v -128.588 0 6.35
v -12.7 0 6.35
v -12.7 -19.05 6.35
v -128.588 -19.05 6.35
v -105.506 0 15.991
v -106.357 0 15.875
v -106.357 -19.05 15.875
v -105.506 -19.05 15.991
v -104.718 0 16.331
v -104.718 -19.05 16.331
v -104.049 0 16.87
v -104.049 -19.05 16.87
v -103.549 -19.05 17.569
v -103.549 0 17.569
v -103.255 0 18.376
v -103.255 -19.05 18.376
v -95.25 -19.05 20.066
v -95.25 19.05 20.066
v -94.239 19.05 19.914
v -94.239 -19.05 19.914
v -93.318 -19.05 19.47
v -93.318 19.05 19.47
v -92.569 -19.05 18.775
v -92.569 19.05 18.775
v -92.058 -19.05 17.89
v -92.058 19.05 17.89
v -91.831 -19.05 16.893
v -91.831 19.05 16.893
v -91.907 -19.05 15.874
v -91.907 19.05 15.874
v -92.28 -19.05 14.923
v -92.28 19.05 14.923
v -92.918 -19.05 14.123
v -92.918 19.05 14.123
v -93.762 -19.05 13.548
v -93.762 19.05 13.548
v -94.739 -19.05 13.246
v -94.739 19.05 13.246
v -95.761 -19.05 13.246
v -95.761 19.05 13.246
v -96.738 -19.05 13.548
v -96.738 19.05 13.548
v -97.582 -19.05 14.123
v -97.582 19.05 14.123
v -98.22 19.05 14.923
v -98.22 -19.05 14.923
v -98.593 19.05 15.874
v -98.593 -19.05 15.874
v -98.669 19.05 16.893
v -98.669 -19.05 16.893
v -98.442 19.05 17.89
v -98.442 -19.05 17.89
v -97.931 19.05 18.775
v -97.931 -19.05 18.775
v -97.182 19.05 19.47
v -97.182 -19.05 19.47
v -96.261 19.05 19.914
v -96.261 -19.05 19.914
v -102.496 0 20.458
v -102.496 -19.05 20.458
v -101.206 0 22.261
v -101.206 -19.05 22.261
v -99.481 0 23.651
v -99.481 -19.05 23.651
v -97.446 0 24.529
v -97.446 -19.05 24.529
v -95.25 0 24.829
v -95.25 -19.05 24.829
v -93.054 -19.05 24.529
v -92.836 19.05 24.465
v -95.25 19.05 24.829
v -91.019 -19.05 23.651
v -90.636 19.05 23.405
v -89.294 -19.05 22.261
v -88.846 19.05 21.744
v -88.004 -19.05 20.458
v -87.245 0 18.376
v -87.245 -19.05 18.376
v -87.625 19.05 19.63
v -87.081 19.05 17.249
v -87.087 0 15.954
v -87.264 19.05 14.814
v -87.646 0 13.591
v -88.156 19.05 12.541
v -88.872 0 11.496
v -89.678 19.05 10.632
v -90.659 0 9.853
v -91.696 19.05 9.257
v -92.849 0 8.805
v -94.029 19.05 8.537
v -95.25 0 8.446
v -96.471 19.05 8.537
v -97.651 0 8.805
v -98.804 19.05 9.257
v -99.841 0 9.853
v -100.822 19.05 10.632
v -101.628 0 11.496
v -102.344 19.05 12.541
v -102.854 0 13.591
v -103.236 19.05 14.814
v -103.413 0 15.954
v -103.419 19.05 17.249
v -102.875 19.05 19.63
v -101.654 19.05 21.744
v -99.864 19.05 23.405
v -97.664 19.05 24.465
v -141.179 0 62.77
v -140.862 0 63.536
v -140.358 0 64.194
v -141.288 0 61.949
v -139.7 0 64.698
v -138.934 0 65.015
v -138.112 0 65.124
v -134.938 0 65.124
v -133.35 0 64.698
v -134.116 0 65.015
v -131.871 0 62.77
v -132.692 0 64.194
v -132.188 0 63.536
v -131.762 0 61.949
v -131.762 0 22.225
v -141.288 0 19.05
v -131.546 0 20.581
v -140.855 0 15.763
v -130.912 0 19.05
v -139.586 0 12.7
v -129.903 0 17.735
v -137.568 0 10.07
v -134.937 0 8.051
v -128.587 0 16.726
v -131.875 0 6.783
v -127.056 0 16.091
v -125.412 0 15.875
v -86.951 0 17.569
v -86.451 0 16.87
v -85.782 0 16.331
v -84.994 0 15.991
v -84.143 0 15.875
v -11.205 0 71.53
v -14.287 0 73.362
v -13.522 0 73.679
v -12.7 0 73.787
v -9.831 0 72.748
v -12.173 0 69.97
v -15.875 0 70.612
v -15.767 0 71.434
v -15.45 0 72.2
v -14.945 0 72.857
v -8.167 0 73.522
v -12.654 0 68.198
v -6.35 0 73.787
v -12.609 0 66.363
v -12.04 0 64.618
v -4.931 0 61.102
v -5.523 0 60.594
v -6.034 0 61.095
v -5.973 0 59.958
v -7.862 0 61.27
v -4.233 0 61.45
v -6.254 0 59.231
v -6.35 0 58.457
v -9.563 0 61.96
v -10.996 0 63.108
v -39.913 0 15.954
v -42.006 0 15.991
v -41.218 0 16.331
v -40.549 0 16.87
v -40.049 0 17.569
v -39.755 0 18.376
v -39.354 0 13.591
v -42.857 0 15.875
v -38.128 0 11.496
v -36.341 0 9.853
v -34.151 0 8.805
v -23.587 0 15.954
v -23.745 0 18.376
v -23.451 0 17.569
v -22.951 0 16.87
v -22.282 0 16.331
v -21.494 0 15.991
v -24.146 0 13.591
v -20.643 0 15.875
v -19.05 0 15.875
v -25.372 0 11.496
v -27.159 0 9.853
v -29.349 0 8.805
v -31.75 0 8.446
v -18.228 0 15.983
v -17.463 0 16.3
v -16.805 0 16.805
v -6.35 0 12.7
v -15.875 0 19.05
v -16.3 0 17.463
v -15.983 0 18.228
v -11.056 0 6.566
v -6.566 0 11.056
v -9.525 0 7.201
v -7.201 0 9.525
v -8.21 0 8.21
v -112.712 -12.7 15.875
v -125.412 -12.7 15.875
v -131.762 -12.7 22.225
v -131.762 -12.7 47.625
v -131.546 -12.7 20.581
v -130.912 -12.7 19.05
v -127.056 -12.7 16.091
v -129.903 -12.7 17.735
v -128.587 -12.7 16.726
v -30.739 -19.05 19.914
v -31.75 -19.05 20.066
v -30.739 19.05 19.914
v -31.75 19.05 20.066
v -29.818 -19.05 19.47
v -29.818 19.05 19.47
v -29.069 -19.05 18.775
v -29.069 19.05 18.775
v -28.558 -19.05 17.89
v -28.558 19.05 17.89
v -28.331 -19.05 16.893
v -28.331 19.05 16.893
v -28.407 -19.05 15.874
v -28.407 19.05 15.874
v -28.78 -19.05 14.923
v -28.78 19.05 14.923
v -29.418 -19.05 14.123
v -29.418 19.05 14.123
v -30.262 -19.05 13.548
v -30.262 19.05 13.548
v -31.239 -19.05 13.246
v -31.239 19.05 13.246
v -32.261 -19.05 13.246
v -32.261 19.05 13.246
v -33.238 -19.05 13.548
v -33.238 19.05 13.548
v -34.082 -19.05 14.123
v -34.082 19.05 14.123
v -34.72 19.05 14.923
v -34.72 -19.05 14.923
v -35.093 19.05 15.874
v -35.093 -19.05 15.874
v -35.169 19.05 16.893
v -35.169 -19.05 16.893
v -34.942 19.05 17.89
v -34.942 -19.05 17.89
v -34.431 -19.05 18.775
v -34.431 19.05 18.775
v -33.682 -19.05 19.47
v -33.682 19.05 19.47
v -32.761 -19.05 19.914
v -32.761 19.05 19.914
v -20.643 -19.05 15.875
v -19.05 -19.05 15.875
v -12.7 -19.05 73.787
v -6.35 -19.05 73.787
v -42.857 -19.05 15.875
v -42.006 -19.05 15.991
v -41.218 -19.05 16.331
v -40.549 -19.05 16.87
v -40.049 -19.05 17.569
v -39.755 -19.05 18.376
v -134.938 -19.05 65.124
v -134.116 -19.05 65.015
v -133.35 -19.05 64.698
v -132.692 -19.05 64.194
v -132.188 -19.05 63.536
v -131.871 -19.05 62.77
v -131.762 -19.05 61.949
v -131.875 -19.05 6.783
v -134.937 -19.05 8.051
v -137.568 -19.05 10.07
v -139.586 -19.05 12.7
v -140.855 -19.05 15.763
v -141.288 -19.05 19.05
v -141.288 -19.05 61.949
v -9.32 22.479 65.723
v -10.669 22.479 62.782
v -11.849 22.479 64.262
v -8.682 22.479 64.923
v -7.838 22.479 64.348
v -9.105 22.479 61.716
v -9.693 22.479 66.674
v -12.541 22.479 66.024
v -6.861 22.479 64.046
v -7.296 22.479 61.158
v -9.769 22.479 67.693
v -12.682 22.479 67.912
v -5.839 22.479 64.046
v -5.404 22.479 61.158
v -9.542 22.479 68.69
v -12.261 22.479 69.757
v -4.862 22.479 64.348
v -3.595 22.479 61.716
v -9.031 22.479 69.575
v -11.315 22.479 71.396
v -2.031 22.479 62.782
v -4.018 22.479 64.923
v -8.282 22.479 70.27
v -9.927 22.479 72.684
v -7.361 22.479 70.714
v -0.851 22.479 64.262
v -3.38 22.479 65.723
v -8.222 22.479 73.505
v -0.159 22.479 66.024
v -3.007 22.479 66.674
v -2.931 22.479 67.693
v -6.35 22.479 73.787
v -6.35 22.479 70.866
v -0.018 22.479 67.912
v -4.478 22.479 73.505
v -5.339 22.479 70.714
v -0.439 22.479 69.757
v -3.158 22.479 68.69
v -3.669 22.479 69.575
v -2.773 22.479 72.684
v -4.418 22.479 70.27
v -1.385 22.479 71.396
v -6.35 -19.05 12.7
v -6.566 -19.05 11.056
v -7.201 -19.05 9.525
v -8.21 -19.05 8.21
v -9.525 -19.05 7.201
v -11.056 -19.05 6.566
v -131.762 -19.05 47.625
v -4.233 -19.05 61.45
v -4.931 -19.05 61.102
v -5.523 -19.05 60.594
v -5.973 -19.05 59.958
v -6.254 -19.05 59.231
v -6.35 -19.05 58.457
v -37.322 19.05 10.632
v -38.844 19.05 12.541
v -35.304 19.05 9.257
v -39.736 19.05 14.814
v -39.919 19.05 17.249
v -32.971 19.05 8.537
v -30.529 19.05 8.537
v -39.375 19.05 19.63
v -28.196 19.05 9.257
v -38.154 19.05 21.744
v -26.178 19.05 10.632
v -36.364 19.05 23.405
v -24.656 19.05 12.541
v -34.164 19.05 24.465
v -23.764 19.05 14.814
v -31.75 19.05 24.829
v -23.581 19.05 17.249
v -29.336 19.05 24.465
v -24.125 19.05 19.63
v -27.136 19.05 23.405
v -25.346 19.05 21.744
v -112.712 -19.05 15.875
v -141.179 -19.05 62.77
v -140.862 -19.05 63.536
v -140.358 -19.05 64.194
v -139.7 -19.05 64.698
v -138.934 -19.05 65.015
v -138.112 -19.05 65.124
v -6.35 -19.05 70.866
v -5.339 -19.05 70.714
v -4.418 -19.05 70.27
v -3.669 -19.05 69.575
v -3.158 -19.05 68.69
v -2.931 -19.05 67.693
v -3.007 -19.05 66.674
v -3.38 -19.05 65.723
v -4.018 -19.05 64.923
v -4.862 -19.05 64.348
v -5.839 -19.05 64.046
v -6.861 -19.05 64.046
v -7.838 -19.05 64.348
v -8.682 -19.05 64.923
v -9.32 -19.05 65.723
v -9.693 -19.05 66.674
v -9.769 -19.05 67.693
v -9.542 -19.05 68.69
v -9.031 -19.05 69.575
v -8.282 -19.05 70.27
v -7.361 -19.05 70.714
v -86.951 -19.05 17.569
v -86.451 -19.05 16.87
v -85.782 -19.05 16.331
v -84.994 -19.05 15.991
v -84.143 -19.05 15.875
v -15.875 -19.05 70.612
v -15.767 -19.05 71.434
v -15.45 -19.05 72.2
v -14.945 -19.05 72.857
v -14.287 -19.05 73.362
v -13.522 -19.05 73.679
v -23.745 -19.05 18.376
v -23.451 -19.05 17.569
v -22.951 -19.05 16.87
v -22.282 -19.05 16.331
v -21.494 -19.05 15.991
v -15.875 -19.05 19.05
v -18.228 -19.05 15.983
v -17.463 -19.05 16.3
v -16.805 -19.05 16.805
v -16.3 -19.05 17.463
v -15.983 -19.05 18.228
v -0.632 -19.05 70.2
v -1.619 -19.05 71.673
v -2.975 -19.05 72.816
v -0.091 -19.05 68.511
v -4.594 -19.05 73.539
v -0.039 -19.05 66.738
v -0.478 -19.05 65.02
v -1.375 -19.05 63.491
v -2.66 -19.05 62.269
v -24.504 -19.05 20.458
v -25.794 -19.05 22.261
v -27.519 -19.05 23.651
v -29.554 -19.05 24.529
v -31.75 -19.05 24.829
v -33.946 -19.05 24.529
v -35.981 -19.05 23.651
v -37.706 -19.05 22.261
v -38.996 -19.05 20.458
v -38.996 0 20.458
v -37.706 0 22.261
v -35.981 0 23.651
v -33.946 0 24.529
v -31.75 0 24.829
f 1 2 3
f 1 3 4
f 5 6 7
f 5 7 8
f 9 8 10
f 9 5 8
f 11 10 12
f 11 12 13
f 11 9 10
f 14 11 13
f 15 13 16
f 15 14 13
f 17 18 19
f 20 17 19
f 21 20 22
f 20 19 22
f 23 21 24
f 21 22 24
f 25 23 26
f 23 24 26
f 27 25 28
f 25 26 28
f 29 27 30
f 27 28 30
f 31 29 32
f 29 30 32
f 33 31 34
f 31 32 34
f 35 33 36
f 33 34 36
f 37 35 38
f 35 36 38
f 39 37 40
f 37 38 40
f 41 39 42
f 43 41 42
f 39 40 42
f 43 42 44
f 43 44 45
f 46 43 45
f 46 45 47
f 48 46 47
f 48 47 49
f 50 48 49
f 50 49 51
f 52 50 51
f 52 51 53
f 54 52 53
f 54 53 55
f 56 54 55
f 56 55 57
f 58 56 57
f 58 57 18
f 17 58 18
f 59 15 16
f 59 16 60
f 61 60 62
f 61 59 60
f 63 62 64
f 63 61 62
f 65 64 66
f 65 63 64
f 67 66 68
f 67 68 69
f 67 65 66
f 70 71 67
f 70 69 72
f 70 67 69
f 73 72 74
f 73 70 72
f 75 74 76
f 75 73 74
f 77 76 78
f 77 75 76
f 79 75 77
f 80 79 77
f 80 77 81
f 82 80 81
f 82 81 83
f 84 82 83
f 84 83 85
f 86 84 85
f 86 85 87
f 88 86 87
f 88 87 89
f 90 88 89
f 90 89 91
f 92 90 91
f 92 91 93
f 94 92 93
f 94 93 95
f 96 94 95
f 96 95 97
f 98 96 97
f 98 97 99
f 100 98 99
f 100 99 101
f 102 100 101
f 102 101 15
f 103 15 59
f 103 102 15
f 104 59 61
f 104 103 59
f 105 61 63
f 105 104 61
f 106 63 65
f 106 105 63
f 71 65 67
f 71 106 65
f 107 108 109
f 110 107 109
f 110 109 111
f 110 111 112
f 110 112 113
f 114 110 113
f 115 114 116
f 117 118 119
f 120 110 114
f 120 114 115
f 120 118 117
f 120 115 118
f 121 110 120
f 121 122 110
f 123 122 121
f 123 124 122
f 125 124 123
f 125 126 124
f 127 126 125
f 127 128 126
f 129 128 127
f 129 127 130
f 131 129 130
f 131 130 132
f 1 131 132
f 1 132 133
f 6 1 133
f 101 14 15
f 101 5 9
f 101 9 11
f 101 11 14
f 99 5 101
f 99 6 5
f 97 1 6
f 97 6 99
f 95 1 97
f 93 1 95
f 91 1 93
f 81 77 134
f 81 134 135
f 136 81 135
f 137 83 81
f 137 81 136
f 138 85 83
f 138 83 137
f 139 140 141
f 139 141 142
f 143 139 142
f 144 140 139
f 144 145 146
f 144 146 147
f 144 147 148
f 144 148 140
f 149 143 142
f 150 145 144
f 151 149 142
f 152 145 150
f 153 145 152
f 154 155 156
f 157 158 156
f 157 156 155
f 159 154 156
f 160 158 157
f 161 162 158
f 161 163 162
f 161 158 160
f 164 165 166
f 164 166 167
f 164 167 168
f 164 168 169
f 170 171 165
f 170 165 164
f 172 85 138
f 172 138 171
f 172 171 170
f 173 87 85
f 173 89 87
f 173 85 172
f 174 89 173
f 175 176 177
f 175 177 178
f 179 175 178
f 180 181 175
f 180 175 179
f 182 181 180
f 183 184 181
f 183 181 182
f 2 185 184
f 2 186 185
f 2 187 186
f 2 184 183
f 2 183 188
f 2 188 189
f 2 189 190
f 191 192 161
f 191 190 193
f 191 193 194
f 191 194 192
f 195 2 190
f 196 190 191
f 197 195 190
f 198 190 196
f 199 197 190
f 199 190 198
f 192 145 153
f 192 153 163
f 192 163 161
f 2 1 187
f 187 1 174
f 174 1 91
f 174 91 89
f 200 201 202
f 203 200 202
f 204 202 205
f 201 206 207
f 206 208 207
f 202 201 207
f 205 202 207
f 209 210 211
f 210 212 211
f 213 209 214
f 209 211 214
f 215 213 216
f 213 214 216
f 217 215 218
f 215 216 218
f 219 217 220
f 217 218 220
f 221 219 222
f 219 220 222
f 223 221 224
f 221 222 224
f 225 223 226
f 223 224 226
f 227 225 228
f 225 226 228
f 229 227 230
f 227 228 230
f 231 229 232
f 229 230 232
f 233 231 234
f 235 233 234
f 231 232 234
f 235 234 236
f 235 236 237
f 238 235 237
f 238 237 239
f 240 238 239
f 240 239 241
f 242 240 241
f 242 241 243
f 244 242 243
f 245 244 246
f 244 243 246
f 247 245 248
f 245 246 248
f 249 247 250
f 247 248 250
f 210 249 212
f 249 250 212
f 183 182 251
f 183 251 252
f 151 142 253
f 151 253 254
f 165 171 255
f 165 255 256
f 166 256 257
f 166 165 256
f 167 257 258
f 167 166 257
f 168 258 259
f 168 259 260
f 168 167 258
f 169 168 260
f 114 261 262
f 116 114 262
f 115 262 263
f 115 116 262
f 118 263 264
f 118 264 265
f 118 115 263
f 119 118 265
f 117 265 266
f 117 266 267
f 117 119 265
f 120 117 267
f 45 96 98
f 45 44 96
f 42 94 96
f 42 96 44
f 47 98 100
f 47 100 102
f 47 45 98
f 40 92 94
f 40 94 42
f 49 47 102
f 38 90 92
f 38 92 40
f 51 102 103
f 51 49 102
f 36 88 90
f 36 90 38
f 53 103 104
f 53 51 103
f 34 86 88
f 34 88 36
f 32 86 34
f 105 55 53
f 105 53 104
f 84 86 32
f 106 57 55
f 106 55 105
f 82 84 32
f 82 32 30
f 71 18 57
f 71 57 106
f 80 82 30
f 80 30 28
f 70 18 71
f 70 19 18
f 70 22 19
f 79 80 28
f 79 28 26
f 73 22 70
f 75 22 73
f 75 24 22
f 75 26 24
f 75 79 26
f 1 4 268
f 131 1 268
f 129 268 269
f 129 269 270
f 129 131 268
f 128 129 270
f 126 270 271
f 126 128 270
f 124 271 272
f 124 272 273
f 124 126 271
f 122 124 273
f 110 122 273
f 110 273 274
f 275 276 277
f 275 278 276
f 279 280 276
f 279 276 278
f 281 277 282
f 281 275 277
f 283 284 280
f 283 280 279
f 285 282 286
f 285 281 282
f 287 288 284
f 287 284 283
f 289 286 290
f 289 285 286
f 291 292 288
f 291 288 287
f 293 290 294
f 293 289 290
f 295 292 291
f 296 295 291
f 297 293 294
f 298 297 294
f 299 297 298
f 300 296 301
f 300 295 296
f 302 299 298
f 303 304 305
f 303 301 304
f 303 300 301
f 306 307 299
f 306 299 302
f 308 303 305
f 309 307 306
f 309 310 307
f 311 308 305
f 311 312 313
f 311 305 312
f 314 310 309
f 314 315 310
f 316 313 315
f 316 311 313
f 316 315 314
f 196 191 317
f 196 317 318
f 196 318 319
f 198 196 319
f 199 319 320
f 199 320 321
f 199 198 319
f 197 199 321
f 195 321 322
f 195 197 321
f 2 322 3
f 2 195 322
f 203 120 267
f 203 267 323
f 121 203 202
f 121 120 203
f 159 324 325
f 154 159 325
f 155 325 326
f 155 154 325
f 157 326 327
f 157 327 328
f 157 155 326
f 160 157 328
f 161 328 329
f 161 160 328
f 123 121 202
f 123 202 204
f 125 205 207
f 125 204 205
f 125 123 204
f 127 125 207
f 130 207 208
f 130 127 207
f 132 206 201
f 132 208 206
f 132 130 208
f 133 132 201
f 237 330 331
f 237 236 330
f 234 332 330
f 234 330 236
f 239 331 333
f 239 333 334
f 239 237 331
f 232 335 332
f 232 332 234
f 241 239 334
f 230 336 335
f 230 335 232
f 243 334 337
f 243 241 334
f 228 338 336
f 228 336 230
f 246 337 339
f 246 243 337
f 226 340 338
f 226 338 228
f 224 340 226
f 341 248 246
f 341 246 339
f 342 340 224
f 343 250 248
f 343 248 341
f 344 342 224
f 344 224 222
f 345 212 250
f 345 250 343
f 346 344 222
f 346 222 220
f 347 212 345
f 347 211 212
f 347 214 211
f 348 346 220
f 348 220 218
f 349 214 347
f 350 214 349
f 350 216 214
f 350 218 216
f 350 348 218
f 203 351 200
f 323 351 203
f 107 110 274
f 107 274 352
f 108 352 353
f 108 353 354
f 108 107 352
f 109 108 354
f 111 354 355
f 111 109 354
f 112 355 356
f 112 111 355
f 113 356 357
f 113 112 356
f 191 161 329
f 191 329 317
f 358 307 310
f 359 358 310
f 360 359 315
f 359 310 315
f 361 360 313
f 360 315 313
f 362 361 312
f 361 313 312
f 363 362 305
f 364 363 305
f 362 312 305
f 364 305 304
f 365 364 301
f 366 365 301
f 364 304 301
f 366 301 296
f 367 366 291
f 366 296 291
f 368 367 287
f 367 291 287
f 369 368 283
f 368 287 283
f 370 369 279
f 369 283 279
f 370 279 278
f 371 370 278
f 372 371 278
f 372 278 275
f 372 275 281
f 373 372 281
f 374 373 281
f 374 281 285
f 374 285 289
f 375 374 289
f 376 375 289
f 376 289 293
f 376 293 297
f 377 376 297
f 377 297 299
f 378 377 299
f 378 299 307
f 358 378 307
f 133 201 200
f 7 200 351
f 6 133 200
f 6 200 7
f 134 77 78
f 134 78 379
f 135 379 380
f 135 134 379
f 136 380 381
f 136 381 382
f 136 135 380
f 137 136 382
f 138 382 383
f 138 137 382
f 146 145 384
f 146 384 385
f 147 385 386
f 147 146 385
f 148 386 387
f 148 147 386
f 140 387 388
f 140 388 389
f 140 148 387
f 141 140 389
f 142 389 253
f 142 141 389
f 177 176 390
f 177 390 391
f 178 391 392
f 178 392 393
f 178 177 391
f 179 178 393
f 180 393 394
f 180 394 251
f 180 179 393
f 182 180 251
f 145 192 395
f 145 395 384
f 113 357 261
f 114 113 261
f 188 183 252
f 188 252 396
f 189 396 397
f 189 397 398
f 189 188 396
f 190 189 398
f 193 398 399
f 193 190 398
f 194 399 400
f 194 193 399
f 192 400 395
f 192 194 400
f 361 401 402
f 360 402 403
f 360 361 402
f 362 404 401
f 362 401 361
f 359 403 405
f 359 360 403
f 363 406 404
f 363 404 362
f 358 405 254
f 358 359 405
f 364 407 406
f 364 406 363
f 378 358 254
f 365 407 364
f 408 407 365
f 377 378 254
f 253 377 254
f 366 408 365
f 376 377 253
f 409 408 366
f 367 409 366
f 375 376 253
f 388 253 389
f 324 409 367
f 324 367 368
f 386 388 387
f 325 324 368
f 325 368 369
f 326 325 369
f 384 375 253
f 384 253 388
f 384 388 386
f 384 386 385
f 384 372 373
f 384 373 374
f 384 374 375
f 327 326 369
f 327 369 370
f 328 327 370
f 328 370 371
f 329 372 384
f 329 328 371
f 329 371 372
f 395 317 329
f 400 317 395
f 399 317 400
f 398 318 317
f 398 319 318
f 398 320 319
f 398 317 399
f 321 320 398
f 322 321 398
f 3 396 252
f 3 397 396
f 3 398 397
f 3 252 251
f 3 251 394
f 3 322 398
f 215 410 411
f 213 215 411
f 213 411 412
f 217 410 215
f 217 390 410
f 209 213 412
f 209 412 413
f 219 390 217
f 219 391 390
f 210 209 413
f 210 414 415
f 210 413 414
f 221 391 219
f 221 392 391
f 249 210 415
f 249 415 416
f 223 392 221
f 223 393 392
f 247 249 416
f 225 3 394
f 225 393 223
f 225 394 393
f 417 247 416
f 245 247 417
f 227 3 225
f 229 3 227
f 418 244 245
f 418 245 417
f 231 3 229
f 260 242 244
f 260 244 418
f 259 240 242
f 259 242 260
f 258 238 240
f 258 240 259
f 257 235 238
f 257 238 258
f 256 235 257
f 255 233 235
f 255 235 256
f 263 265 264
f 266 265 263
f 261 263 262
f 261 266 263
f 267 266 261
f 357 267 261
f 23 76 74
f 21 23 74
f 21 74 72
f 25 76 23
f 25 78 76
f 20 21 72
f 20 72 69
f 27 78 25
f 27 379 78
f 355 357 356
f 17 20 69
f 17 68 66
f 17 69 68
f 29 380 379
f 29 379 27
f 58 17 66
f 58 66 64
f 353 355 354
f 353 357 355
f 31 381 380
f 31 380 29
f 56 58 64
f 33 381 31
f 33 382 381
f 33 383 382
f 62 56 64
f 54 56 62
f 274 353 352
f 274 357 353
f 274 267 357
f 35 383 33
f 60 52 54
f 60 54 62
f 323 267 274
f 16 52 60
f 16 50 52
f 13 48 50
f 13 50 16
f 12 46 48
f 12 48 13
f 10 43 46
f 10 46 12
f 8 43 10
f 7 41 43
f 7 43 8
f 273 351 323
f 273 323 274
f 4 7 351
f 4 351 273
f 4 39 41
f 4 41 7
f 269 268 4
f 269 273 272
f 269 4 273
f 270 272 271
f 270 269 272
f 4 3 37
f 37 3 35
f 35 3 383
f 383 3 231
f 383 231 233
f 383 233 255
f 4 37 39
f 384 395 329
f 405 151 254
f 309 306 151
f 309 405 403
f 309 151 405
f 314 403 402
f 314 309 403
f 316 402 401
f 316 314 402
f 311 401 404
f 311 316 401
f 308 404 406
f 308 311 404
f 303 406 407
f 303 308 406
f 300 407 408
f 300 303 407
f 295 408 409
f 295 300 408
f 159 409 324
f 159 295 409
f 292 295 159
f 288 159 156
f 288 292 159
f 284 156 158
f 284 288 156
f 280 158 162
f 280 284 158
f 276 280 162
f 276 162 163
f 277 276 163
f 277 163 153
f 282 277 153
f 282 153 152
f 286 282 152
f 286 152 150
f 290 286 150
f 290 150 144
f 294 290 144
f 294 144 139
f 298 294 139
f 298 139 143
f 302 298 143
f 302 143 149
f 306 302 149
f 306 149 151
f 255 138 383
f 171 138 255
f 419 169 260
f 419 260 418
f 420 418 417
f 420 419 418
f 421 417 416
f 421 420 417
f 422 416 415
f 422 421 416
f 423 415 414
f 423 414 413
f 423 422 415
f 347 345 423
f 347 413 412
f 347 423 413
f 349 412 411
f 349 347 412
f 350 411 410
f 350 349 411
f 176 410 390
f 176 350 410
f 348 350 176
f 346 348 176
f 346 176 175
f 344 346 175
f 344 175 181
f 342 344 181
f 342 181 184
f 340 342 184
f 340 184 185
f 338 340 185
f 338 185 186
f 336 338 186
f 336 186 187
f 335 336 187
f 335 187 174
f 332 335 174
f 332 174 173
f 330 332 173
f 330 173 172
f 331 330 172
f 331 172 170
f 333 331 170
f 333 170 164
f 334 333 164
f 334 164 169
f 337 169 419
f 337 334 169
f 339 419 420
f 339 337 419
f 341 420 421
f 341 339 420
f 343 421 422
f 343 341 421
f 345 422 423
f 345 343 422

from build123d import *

# Parameters (mm, degrees)
SKETCH2_R           = 3.429
BOSS_EXTRUDE1_DEPTH = 19.05
BOSS_EXTRUDE2_START = 19.05
SKETCH3_R           = 8.1915
SKETCH3_R_2         = 3.429
SKETCH3_R_3         = 6.35
BOSS_EXTRUDE2_DEPTH = 19.05
BOSS_EXTRUDE5_START = 3.429
SKETCH4_R           = 6.35
SKETCH4_R_2         = 3.429
BOSS_EXTRUDE5_DEPTH = 3.429
BOSS_EXTRUDE6_START = -19.05
BOSS_EXTRUDE6_DEPTH = 6.35


with BuildPart() as part:
    # Sketch2 → Boss-Extrude1 (new body)
    with BuildSketch(Plane(origin=(0, 0, 0), x_dir=(1, 0, 0), z_dir=(0, 1, 0))):
        with BuildLine():
            Line((-84.142567987, -15.875), (-42.857432013, -15.875))
            ThreePointArc((-42.857432013, -15.875), (-40.864863591, -16.578098691), (-39.754797373, -18.375994594))
            ThreePointArc((-39.754797373, -18.375994594), (-31.75, -24.828560646), (-23.745202627, -18.375994594))
            ThreePointArc((-23.745202627, -18.375994594), (-22.635136409, -16.578098691), (-20.642567987, -15.875))
            Line((-20.642567987, -15.875), (-19.05, -15.875))
            ThreePointArc((-19.05, -15.875), (-16.80493597, -16.80493597), (-15.875, -19.05))
            Line((-15.875, -19.05), (-15.875, -70.612060646))
            ThreePointArc((-15.875, -70.612060646), (-14.94506403, -72.857124676), (-12.7, -73.787060646))
            Line((-12.7, -73.787060646), (-6.35, -73.787060646))
            ThreePointArc((-6.35, -73.787060646), (-0.091449146, -68.510858211), (-4.233333333, -61.450223232))
            ThreePointArc((-4.233333333, -61.450223232), (-5.767376644, -60.28989163), (-6.35, -58.456804525))
            Line((-6.35, -58.456804525), (-6.35, -12.7))
            ThreePointArc((-6.35, -12.7), (-8.209871939, -8.209871939), (-12.7, -6.35))
            Line((-12.7, -6.35), (-128.5875, -6.35))
            ThreePointArc((-128.5875, -6.35), (-137.567756121, -10.069743879), (-141.2875, -19.05))
            Line((-141.2875, -19.05), (-141.2875, -61.948583794))
            ThreePointArc((-141.2875, -61.948583794), (-140.35756403, -64.193647824), (-138.1125, -65.123583794))
            Line((-138.1125, -65.123583794), (-134.9375, -65.123583794))
            ThreePointArc((-134.9375, -65.123583794), (-132.69243597, -64.193647824), (-131.7625, -61.948583794))
            Line((-131.7625, -61.948583794), (-131.7625, -22.225))
            ThreePointArc((-131.7625, -22.225), (-129.90262806, -17.734871939), (-125.4125, -15.875))
            Line((-125.4125, -15.875), (-106.357432013, -15.875))
            ThreePointArc((-106.357432013, -15.875), (-104.364863591, -16.578098691), (-103.254797373, -18.375994594))
            ThreePointArc((-103.254797373, -18.375994594), (-95.25, -24.828560646), (-87.245202627, -18.375994594))
            ThreePointArc((-87.245202627, -18.375994594), (-86.135136409, -16.578098691), (-84.142567987, -15.875))
        make_face()
        with Locations(Location((-95.25, -16.637060646, 0), (0, 0, 270))):
            Circle(SKETCH2_R, mode=Mode.SUBTRACT)
        with Locations(Location((-31.75, -16.637060646, 0), (0, 0, 270))):
            Circle(SKETCH2_R, mode=Mode.SUBTRACT)
        with Locations(Location((-6.35, -67.437060646, 0), (0, 0, 270))):
            Circle(SKETCH2_R, mode=Mode.SUBTRACT)
    extrude(amount=-BOSS_EXTRUDE1_DEPTH)

    # Sketch3 → Boss-Extrude2 (add)
    # profile 1 of 3: a face of its own
    with BuildSketch(Plane(origin=(0, 0, 0), x_dir=(1, 0, 0), z_dir=(0, 1, 0)).offset(BOSS_EXTRUDE2_START)):
        with Locations(Location((-95.25, -16.637060646, 0), (0, 0, 270))):
            Circle(SKETCH3_R)
        with Locations(Location((-95.25, -16.637060646, 0), (0, 0, 270))):
            Circle(SKETCH3_R_2, mode=Mode.SUBTRACT)
    # profile 2 of 3: a face of its own
    with BuildSketch(Plane(origin=(0, 0, 0), x_dir=(1, 0, 0), z_dir=(0, 1, 0)).offset(BOSS_EXTRUDE2_START)):
        with Locations(Location((-31.75, -16.637060646, 0), (0, 0, 270))):
            Circle(SKETCH3_R)
        with Locations(Location((-31.75, -16.637060646, 0), (0, 0, 270))):
            Circle(SKETCH3_R_2, mode=Mode.SUBTRACT)
    # profile 3 of 3: a face of its own
    with BuildSketch(Plane(origin=(0, 0, 0), x_dir=(1, 0, 0), z_dir=(0, 1, 0)).offset(BOSS_EXTRUDE2_START)):
        with Locations(Location((-6.35, -67.437060646, 0), (0, 0, 270))):
            Circle(SKETCH3_R_3)
        with Locations(Location((-6.35, -67.437060646, 0), (0, 0, 270))):
            Circle(SKETCH3_R_2, mode=Mode.SUBTRACT)
    extrude(amount=-BOSS_EXTRUDE2_DEPTH)

    # Sketch4 → Boss-Extrude5 (add)
    with BuildSketch(Plane(origin=(0, 19.05, 0), x_dir=(1, 0, 0), z_dir=(0, 1, 0)).offset(BOSS_EXTRUDE5_START)):
        with Locations(Location((-6.35, -67.437060646, 0), (0, 0, 270))):
            Circle(SKETCH4_R)
        with Locations(Location((-6.35, -67.437060646, 0), (0, 0, 270))):
            Circle(SKETCH4_R_2, mode=Mode.SUBTRACT)
    extrude(amount=-BOSS_EXTRUDE5_DEPTH)

    # Sketch6 → Boss-Extrude6 (add)
    with BuildSketch(Plane(origin=(0, 0, 0), x_dir=(1, 0, 0), z_dir=(0, 1, 0)).offset(BOSS_EXTRUDE6_START)):
        Polygon((-112.7125, -15.875), (-131.7625, -47.625), (-131.7625, -15.875), align=None)
    extrude(amount=BOSS_EXTRUDE6_DEPTH)


solid = part.part
